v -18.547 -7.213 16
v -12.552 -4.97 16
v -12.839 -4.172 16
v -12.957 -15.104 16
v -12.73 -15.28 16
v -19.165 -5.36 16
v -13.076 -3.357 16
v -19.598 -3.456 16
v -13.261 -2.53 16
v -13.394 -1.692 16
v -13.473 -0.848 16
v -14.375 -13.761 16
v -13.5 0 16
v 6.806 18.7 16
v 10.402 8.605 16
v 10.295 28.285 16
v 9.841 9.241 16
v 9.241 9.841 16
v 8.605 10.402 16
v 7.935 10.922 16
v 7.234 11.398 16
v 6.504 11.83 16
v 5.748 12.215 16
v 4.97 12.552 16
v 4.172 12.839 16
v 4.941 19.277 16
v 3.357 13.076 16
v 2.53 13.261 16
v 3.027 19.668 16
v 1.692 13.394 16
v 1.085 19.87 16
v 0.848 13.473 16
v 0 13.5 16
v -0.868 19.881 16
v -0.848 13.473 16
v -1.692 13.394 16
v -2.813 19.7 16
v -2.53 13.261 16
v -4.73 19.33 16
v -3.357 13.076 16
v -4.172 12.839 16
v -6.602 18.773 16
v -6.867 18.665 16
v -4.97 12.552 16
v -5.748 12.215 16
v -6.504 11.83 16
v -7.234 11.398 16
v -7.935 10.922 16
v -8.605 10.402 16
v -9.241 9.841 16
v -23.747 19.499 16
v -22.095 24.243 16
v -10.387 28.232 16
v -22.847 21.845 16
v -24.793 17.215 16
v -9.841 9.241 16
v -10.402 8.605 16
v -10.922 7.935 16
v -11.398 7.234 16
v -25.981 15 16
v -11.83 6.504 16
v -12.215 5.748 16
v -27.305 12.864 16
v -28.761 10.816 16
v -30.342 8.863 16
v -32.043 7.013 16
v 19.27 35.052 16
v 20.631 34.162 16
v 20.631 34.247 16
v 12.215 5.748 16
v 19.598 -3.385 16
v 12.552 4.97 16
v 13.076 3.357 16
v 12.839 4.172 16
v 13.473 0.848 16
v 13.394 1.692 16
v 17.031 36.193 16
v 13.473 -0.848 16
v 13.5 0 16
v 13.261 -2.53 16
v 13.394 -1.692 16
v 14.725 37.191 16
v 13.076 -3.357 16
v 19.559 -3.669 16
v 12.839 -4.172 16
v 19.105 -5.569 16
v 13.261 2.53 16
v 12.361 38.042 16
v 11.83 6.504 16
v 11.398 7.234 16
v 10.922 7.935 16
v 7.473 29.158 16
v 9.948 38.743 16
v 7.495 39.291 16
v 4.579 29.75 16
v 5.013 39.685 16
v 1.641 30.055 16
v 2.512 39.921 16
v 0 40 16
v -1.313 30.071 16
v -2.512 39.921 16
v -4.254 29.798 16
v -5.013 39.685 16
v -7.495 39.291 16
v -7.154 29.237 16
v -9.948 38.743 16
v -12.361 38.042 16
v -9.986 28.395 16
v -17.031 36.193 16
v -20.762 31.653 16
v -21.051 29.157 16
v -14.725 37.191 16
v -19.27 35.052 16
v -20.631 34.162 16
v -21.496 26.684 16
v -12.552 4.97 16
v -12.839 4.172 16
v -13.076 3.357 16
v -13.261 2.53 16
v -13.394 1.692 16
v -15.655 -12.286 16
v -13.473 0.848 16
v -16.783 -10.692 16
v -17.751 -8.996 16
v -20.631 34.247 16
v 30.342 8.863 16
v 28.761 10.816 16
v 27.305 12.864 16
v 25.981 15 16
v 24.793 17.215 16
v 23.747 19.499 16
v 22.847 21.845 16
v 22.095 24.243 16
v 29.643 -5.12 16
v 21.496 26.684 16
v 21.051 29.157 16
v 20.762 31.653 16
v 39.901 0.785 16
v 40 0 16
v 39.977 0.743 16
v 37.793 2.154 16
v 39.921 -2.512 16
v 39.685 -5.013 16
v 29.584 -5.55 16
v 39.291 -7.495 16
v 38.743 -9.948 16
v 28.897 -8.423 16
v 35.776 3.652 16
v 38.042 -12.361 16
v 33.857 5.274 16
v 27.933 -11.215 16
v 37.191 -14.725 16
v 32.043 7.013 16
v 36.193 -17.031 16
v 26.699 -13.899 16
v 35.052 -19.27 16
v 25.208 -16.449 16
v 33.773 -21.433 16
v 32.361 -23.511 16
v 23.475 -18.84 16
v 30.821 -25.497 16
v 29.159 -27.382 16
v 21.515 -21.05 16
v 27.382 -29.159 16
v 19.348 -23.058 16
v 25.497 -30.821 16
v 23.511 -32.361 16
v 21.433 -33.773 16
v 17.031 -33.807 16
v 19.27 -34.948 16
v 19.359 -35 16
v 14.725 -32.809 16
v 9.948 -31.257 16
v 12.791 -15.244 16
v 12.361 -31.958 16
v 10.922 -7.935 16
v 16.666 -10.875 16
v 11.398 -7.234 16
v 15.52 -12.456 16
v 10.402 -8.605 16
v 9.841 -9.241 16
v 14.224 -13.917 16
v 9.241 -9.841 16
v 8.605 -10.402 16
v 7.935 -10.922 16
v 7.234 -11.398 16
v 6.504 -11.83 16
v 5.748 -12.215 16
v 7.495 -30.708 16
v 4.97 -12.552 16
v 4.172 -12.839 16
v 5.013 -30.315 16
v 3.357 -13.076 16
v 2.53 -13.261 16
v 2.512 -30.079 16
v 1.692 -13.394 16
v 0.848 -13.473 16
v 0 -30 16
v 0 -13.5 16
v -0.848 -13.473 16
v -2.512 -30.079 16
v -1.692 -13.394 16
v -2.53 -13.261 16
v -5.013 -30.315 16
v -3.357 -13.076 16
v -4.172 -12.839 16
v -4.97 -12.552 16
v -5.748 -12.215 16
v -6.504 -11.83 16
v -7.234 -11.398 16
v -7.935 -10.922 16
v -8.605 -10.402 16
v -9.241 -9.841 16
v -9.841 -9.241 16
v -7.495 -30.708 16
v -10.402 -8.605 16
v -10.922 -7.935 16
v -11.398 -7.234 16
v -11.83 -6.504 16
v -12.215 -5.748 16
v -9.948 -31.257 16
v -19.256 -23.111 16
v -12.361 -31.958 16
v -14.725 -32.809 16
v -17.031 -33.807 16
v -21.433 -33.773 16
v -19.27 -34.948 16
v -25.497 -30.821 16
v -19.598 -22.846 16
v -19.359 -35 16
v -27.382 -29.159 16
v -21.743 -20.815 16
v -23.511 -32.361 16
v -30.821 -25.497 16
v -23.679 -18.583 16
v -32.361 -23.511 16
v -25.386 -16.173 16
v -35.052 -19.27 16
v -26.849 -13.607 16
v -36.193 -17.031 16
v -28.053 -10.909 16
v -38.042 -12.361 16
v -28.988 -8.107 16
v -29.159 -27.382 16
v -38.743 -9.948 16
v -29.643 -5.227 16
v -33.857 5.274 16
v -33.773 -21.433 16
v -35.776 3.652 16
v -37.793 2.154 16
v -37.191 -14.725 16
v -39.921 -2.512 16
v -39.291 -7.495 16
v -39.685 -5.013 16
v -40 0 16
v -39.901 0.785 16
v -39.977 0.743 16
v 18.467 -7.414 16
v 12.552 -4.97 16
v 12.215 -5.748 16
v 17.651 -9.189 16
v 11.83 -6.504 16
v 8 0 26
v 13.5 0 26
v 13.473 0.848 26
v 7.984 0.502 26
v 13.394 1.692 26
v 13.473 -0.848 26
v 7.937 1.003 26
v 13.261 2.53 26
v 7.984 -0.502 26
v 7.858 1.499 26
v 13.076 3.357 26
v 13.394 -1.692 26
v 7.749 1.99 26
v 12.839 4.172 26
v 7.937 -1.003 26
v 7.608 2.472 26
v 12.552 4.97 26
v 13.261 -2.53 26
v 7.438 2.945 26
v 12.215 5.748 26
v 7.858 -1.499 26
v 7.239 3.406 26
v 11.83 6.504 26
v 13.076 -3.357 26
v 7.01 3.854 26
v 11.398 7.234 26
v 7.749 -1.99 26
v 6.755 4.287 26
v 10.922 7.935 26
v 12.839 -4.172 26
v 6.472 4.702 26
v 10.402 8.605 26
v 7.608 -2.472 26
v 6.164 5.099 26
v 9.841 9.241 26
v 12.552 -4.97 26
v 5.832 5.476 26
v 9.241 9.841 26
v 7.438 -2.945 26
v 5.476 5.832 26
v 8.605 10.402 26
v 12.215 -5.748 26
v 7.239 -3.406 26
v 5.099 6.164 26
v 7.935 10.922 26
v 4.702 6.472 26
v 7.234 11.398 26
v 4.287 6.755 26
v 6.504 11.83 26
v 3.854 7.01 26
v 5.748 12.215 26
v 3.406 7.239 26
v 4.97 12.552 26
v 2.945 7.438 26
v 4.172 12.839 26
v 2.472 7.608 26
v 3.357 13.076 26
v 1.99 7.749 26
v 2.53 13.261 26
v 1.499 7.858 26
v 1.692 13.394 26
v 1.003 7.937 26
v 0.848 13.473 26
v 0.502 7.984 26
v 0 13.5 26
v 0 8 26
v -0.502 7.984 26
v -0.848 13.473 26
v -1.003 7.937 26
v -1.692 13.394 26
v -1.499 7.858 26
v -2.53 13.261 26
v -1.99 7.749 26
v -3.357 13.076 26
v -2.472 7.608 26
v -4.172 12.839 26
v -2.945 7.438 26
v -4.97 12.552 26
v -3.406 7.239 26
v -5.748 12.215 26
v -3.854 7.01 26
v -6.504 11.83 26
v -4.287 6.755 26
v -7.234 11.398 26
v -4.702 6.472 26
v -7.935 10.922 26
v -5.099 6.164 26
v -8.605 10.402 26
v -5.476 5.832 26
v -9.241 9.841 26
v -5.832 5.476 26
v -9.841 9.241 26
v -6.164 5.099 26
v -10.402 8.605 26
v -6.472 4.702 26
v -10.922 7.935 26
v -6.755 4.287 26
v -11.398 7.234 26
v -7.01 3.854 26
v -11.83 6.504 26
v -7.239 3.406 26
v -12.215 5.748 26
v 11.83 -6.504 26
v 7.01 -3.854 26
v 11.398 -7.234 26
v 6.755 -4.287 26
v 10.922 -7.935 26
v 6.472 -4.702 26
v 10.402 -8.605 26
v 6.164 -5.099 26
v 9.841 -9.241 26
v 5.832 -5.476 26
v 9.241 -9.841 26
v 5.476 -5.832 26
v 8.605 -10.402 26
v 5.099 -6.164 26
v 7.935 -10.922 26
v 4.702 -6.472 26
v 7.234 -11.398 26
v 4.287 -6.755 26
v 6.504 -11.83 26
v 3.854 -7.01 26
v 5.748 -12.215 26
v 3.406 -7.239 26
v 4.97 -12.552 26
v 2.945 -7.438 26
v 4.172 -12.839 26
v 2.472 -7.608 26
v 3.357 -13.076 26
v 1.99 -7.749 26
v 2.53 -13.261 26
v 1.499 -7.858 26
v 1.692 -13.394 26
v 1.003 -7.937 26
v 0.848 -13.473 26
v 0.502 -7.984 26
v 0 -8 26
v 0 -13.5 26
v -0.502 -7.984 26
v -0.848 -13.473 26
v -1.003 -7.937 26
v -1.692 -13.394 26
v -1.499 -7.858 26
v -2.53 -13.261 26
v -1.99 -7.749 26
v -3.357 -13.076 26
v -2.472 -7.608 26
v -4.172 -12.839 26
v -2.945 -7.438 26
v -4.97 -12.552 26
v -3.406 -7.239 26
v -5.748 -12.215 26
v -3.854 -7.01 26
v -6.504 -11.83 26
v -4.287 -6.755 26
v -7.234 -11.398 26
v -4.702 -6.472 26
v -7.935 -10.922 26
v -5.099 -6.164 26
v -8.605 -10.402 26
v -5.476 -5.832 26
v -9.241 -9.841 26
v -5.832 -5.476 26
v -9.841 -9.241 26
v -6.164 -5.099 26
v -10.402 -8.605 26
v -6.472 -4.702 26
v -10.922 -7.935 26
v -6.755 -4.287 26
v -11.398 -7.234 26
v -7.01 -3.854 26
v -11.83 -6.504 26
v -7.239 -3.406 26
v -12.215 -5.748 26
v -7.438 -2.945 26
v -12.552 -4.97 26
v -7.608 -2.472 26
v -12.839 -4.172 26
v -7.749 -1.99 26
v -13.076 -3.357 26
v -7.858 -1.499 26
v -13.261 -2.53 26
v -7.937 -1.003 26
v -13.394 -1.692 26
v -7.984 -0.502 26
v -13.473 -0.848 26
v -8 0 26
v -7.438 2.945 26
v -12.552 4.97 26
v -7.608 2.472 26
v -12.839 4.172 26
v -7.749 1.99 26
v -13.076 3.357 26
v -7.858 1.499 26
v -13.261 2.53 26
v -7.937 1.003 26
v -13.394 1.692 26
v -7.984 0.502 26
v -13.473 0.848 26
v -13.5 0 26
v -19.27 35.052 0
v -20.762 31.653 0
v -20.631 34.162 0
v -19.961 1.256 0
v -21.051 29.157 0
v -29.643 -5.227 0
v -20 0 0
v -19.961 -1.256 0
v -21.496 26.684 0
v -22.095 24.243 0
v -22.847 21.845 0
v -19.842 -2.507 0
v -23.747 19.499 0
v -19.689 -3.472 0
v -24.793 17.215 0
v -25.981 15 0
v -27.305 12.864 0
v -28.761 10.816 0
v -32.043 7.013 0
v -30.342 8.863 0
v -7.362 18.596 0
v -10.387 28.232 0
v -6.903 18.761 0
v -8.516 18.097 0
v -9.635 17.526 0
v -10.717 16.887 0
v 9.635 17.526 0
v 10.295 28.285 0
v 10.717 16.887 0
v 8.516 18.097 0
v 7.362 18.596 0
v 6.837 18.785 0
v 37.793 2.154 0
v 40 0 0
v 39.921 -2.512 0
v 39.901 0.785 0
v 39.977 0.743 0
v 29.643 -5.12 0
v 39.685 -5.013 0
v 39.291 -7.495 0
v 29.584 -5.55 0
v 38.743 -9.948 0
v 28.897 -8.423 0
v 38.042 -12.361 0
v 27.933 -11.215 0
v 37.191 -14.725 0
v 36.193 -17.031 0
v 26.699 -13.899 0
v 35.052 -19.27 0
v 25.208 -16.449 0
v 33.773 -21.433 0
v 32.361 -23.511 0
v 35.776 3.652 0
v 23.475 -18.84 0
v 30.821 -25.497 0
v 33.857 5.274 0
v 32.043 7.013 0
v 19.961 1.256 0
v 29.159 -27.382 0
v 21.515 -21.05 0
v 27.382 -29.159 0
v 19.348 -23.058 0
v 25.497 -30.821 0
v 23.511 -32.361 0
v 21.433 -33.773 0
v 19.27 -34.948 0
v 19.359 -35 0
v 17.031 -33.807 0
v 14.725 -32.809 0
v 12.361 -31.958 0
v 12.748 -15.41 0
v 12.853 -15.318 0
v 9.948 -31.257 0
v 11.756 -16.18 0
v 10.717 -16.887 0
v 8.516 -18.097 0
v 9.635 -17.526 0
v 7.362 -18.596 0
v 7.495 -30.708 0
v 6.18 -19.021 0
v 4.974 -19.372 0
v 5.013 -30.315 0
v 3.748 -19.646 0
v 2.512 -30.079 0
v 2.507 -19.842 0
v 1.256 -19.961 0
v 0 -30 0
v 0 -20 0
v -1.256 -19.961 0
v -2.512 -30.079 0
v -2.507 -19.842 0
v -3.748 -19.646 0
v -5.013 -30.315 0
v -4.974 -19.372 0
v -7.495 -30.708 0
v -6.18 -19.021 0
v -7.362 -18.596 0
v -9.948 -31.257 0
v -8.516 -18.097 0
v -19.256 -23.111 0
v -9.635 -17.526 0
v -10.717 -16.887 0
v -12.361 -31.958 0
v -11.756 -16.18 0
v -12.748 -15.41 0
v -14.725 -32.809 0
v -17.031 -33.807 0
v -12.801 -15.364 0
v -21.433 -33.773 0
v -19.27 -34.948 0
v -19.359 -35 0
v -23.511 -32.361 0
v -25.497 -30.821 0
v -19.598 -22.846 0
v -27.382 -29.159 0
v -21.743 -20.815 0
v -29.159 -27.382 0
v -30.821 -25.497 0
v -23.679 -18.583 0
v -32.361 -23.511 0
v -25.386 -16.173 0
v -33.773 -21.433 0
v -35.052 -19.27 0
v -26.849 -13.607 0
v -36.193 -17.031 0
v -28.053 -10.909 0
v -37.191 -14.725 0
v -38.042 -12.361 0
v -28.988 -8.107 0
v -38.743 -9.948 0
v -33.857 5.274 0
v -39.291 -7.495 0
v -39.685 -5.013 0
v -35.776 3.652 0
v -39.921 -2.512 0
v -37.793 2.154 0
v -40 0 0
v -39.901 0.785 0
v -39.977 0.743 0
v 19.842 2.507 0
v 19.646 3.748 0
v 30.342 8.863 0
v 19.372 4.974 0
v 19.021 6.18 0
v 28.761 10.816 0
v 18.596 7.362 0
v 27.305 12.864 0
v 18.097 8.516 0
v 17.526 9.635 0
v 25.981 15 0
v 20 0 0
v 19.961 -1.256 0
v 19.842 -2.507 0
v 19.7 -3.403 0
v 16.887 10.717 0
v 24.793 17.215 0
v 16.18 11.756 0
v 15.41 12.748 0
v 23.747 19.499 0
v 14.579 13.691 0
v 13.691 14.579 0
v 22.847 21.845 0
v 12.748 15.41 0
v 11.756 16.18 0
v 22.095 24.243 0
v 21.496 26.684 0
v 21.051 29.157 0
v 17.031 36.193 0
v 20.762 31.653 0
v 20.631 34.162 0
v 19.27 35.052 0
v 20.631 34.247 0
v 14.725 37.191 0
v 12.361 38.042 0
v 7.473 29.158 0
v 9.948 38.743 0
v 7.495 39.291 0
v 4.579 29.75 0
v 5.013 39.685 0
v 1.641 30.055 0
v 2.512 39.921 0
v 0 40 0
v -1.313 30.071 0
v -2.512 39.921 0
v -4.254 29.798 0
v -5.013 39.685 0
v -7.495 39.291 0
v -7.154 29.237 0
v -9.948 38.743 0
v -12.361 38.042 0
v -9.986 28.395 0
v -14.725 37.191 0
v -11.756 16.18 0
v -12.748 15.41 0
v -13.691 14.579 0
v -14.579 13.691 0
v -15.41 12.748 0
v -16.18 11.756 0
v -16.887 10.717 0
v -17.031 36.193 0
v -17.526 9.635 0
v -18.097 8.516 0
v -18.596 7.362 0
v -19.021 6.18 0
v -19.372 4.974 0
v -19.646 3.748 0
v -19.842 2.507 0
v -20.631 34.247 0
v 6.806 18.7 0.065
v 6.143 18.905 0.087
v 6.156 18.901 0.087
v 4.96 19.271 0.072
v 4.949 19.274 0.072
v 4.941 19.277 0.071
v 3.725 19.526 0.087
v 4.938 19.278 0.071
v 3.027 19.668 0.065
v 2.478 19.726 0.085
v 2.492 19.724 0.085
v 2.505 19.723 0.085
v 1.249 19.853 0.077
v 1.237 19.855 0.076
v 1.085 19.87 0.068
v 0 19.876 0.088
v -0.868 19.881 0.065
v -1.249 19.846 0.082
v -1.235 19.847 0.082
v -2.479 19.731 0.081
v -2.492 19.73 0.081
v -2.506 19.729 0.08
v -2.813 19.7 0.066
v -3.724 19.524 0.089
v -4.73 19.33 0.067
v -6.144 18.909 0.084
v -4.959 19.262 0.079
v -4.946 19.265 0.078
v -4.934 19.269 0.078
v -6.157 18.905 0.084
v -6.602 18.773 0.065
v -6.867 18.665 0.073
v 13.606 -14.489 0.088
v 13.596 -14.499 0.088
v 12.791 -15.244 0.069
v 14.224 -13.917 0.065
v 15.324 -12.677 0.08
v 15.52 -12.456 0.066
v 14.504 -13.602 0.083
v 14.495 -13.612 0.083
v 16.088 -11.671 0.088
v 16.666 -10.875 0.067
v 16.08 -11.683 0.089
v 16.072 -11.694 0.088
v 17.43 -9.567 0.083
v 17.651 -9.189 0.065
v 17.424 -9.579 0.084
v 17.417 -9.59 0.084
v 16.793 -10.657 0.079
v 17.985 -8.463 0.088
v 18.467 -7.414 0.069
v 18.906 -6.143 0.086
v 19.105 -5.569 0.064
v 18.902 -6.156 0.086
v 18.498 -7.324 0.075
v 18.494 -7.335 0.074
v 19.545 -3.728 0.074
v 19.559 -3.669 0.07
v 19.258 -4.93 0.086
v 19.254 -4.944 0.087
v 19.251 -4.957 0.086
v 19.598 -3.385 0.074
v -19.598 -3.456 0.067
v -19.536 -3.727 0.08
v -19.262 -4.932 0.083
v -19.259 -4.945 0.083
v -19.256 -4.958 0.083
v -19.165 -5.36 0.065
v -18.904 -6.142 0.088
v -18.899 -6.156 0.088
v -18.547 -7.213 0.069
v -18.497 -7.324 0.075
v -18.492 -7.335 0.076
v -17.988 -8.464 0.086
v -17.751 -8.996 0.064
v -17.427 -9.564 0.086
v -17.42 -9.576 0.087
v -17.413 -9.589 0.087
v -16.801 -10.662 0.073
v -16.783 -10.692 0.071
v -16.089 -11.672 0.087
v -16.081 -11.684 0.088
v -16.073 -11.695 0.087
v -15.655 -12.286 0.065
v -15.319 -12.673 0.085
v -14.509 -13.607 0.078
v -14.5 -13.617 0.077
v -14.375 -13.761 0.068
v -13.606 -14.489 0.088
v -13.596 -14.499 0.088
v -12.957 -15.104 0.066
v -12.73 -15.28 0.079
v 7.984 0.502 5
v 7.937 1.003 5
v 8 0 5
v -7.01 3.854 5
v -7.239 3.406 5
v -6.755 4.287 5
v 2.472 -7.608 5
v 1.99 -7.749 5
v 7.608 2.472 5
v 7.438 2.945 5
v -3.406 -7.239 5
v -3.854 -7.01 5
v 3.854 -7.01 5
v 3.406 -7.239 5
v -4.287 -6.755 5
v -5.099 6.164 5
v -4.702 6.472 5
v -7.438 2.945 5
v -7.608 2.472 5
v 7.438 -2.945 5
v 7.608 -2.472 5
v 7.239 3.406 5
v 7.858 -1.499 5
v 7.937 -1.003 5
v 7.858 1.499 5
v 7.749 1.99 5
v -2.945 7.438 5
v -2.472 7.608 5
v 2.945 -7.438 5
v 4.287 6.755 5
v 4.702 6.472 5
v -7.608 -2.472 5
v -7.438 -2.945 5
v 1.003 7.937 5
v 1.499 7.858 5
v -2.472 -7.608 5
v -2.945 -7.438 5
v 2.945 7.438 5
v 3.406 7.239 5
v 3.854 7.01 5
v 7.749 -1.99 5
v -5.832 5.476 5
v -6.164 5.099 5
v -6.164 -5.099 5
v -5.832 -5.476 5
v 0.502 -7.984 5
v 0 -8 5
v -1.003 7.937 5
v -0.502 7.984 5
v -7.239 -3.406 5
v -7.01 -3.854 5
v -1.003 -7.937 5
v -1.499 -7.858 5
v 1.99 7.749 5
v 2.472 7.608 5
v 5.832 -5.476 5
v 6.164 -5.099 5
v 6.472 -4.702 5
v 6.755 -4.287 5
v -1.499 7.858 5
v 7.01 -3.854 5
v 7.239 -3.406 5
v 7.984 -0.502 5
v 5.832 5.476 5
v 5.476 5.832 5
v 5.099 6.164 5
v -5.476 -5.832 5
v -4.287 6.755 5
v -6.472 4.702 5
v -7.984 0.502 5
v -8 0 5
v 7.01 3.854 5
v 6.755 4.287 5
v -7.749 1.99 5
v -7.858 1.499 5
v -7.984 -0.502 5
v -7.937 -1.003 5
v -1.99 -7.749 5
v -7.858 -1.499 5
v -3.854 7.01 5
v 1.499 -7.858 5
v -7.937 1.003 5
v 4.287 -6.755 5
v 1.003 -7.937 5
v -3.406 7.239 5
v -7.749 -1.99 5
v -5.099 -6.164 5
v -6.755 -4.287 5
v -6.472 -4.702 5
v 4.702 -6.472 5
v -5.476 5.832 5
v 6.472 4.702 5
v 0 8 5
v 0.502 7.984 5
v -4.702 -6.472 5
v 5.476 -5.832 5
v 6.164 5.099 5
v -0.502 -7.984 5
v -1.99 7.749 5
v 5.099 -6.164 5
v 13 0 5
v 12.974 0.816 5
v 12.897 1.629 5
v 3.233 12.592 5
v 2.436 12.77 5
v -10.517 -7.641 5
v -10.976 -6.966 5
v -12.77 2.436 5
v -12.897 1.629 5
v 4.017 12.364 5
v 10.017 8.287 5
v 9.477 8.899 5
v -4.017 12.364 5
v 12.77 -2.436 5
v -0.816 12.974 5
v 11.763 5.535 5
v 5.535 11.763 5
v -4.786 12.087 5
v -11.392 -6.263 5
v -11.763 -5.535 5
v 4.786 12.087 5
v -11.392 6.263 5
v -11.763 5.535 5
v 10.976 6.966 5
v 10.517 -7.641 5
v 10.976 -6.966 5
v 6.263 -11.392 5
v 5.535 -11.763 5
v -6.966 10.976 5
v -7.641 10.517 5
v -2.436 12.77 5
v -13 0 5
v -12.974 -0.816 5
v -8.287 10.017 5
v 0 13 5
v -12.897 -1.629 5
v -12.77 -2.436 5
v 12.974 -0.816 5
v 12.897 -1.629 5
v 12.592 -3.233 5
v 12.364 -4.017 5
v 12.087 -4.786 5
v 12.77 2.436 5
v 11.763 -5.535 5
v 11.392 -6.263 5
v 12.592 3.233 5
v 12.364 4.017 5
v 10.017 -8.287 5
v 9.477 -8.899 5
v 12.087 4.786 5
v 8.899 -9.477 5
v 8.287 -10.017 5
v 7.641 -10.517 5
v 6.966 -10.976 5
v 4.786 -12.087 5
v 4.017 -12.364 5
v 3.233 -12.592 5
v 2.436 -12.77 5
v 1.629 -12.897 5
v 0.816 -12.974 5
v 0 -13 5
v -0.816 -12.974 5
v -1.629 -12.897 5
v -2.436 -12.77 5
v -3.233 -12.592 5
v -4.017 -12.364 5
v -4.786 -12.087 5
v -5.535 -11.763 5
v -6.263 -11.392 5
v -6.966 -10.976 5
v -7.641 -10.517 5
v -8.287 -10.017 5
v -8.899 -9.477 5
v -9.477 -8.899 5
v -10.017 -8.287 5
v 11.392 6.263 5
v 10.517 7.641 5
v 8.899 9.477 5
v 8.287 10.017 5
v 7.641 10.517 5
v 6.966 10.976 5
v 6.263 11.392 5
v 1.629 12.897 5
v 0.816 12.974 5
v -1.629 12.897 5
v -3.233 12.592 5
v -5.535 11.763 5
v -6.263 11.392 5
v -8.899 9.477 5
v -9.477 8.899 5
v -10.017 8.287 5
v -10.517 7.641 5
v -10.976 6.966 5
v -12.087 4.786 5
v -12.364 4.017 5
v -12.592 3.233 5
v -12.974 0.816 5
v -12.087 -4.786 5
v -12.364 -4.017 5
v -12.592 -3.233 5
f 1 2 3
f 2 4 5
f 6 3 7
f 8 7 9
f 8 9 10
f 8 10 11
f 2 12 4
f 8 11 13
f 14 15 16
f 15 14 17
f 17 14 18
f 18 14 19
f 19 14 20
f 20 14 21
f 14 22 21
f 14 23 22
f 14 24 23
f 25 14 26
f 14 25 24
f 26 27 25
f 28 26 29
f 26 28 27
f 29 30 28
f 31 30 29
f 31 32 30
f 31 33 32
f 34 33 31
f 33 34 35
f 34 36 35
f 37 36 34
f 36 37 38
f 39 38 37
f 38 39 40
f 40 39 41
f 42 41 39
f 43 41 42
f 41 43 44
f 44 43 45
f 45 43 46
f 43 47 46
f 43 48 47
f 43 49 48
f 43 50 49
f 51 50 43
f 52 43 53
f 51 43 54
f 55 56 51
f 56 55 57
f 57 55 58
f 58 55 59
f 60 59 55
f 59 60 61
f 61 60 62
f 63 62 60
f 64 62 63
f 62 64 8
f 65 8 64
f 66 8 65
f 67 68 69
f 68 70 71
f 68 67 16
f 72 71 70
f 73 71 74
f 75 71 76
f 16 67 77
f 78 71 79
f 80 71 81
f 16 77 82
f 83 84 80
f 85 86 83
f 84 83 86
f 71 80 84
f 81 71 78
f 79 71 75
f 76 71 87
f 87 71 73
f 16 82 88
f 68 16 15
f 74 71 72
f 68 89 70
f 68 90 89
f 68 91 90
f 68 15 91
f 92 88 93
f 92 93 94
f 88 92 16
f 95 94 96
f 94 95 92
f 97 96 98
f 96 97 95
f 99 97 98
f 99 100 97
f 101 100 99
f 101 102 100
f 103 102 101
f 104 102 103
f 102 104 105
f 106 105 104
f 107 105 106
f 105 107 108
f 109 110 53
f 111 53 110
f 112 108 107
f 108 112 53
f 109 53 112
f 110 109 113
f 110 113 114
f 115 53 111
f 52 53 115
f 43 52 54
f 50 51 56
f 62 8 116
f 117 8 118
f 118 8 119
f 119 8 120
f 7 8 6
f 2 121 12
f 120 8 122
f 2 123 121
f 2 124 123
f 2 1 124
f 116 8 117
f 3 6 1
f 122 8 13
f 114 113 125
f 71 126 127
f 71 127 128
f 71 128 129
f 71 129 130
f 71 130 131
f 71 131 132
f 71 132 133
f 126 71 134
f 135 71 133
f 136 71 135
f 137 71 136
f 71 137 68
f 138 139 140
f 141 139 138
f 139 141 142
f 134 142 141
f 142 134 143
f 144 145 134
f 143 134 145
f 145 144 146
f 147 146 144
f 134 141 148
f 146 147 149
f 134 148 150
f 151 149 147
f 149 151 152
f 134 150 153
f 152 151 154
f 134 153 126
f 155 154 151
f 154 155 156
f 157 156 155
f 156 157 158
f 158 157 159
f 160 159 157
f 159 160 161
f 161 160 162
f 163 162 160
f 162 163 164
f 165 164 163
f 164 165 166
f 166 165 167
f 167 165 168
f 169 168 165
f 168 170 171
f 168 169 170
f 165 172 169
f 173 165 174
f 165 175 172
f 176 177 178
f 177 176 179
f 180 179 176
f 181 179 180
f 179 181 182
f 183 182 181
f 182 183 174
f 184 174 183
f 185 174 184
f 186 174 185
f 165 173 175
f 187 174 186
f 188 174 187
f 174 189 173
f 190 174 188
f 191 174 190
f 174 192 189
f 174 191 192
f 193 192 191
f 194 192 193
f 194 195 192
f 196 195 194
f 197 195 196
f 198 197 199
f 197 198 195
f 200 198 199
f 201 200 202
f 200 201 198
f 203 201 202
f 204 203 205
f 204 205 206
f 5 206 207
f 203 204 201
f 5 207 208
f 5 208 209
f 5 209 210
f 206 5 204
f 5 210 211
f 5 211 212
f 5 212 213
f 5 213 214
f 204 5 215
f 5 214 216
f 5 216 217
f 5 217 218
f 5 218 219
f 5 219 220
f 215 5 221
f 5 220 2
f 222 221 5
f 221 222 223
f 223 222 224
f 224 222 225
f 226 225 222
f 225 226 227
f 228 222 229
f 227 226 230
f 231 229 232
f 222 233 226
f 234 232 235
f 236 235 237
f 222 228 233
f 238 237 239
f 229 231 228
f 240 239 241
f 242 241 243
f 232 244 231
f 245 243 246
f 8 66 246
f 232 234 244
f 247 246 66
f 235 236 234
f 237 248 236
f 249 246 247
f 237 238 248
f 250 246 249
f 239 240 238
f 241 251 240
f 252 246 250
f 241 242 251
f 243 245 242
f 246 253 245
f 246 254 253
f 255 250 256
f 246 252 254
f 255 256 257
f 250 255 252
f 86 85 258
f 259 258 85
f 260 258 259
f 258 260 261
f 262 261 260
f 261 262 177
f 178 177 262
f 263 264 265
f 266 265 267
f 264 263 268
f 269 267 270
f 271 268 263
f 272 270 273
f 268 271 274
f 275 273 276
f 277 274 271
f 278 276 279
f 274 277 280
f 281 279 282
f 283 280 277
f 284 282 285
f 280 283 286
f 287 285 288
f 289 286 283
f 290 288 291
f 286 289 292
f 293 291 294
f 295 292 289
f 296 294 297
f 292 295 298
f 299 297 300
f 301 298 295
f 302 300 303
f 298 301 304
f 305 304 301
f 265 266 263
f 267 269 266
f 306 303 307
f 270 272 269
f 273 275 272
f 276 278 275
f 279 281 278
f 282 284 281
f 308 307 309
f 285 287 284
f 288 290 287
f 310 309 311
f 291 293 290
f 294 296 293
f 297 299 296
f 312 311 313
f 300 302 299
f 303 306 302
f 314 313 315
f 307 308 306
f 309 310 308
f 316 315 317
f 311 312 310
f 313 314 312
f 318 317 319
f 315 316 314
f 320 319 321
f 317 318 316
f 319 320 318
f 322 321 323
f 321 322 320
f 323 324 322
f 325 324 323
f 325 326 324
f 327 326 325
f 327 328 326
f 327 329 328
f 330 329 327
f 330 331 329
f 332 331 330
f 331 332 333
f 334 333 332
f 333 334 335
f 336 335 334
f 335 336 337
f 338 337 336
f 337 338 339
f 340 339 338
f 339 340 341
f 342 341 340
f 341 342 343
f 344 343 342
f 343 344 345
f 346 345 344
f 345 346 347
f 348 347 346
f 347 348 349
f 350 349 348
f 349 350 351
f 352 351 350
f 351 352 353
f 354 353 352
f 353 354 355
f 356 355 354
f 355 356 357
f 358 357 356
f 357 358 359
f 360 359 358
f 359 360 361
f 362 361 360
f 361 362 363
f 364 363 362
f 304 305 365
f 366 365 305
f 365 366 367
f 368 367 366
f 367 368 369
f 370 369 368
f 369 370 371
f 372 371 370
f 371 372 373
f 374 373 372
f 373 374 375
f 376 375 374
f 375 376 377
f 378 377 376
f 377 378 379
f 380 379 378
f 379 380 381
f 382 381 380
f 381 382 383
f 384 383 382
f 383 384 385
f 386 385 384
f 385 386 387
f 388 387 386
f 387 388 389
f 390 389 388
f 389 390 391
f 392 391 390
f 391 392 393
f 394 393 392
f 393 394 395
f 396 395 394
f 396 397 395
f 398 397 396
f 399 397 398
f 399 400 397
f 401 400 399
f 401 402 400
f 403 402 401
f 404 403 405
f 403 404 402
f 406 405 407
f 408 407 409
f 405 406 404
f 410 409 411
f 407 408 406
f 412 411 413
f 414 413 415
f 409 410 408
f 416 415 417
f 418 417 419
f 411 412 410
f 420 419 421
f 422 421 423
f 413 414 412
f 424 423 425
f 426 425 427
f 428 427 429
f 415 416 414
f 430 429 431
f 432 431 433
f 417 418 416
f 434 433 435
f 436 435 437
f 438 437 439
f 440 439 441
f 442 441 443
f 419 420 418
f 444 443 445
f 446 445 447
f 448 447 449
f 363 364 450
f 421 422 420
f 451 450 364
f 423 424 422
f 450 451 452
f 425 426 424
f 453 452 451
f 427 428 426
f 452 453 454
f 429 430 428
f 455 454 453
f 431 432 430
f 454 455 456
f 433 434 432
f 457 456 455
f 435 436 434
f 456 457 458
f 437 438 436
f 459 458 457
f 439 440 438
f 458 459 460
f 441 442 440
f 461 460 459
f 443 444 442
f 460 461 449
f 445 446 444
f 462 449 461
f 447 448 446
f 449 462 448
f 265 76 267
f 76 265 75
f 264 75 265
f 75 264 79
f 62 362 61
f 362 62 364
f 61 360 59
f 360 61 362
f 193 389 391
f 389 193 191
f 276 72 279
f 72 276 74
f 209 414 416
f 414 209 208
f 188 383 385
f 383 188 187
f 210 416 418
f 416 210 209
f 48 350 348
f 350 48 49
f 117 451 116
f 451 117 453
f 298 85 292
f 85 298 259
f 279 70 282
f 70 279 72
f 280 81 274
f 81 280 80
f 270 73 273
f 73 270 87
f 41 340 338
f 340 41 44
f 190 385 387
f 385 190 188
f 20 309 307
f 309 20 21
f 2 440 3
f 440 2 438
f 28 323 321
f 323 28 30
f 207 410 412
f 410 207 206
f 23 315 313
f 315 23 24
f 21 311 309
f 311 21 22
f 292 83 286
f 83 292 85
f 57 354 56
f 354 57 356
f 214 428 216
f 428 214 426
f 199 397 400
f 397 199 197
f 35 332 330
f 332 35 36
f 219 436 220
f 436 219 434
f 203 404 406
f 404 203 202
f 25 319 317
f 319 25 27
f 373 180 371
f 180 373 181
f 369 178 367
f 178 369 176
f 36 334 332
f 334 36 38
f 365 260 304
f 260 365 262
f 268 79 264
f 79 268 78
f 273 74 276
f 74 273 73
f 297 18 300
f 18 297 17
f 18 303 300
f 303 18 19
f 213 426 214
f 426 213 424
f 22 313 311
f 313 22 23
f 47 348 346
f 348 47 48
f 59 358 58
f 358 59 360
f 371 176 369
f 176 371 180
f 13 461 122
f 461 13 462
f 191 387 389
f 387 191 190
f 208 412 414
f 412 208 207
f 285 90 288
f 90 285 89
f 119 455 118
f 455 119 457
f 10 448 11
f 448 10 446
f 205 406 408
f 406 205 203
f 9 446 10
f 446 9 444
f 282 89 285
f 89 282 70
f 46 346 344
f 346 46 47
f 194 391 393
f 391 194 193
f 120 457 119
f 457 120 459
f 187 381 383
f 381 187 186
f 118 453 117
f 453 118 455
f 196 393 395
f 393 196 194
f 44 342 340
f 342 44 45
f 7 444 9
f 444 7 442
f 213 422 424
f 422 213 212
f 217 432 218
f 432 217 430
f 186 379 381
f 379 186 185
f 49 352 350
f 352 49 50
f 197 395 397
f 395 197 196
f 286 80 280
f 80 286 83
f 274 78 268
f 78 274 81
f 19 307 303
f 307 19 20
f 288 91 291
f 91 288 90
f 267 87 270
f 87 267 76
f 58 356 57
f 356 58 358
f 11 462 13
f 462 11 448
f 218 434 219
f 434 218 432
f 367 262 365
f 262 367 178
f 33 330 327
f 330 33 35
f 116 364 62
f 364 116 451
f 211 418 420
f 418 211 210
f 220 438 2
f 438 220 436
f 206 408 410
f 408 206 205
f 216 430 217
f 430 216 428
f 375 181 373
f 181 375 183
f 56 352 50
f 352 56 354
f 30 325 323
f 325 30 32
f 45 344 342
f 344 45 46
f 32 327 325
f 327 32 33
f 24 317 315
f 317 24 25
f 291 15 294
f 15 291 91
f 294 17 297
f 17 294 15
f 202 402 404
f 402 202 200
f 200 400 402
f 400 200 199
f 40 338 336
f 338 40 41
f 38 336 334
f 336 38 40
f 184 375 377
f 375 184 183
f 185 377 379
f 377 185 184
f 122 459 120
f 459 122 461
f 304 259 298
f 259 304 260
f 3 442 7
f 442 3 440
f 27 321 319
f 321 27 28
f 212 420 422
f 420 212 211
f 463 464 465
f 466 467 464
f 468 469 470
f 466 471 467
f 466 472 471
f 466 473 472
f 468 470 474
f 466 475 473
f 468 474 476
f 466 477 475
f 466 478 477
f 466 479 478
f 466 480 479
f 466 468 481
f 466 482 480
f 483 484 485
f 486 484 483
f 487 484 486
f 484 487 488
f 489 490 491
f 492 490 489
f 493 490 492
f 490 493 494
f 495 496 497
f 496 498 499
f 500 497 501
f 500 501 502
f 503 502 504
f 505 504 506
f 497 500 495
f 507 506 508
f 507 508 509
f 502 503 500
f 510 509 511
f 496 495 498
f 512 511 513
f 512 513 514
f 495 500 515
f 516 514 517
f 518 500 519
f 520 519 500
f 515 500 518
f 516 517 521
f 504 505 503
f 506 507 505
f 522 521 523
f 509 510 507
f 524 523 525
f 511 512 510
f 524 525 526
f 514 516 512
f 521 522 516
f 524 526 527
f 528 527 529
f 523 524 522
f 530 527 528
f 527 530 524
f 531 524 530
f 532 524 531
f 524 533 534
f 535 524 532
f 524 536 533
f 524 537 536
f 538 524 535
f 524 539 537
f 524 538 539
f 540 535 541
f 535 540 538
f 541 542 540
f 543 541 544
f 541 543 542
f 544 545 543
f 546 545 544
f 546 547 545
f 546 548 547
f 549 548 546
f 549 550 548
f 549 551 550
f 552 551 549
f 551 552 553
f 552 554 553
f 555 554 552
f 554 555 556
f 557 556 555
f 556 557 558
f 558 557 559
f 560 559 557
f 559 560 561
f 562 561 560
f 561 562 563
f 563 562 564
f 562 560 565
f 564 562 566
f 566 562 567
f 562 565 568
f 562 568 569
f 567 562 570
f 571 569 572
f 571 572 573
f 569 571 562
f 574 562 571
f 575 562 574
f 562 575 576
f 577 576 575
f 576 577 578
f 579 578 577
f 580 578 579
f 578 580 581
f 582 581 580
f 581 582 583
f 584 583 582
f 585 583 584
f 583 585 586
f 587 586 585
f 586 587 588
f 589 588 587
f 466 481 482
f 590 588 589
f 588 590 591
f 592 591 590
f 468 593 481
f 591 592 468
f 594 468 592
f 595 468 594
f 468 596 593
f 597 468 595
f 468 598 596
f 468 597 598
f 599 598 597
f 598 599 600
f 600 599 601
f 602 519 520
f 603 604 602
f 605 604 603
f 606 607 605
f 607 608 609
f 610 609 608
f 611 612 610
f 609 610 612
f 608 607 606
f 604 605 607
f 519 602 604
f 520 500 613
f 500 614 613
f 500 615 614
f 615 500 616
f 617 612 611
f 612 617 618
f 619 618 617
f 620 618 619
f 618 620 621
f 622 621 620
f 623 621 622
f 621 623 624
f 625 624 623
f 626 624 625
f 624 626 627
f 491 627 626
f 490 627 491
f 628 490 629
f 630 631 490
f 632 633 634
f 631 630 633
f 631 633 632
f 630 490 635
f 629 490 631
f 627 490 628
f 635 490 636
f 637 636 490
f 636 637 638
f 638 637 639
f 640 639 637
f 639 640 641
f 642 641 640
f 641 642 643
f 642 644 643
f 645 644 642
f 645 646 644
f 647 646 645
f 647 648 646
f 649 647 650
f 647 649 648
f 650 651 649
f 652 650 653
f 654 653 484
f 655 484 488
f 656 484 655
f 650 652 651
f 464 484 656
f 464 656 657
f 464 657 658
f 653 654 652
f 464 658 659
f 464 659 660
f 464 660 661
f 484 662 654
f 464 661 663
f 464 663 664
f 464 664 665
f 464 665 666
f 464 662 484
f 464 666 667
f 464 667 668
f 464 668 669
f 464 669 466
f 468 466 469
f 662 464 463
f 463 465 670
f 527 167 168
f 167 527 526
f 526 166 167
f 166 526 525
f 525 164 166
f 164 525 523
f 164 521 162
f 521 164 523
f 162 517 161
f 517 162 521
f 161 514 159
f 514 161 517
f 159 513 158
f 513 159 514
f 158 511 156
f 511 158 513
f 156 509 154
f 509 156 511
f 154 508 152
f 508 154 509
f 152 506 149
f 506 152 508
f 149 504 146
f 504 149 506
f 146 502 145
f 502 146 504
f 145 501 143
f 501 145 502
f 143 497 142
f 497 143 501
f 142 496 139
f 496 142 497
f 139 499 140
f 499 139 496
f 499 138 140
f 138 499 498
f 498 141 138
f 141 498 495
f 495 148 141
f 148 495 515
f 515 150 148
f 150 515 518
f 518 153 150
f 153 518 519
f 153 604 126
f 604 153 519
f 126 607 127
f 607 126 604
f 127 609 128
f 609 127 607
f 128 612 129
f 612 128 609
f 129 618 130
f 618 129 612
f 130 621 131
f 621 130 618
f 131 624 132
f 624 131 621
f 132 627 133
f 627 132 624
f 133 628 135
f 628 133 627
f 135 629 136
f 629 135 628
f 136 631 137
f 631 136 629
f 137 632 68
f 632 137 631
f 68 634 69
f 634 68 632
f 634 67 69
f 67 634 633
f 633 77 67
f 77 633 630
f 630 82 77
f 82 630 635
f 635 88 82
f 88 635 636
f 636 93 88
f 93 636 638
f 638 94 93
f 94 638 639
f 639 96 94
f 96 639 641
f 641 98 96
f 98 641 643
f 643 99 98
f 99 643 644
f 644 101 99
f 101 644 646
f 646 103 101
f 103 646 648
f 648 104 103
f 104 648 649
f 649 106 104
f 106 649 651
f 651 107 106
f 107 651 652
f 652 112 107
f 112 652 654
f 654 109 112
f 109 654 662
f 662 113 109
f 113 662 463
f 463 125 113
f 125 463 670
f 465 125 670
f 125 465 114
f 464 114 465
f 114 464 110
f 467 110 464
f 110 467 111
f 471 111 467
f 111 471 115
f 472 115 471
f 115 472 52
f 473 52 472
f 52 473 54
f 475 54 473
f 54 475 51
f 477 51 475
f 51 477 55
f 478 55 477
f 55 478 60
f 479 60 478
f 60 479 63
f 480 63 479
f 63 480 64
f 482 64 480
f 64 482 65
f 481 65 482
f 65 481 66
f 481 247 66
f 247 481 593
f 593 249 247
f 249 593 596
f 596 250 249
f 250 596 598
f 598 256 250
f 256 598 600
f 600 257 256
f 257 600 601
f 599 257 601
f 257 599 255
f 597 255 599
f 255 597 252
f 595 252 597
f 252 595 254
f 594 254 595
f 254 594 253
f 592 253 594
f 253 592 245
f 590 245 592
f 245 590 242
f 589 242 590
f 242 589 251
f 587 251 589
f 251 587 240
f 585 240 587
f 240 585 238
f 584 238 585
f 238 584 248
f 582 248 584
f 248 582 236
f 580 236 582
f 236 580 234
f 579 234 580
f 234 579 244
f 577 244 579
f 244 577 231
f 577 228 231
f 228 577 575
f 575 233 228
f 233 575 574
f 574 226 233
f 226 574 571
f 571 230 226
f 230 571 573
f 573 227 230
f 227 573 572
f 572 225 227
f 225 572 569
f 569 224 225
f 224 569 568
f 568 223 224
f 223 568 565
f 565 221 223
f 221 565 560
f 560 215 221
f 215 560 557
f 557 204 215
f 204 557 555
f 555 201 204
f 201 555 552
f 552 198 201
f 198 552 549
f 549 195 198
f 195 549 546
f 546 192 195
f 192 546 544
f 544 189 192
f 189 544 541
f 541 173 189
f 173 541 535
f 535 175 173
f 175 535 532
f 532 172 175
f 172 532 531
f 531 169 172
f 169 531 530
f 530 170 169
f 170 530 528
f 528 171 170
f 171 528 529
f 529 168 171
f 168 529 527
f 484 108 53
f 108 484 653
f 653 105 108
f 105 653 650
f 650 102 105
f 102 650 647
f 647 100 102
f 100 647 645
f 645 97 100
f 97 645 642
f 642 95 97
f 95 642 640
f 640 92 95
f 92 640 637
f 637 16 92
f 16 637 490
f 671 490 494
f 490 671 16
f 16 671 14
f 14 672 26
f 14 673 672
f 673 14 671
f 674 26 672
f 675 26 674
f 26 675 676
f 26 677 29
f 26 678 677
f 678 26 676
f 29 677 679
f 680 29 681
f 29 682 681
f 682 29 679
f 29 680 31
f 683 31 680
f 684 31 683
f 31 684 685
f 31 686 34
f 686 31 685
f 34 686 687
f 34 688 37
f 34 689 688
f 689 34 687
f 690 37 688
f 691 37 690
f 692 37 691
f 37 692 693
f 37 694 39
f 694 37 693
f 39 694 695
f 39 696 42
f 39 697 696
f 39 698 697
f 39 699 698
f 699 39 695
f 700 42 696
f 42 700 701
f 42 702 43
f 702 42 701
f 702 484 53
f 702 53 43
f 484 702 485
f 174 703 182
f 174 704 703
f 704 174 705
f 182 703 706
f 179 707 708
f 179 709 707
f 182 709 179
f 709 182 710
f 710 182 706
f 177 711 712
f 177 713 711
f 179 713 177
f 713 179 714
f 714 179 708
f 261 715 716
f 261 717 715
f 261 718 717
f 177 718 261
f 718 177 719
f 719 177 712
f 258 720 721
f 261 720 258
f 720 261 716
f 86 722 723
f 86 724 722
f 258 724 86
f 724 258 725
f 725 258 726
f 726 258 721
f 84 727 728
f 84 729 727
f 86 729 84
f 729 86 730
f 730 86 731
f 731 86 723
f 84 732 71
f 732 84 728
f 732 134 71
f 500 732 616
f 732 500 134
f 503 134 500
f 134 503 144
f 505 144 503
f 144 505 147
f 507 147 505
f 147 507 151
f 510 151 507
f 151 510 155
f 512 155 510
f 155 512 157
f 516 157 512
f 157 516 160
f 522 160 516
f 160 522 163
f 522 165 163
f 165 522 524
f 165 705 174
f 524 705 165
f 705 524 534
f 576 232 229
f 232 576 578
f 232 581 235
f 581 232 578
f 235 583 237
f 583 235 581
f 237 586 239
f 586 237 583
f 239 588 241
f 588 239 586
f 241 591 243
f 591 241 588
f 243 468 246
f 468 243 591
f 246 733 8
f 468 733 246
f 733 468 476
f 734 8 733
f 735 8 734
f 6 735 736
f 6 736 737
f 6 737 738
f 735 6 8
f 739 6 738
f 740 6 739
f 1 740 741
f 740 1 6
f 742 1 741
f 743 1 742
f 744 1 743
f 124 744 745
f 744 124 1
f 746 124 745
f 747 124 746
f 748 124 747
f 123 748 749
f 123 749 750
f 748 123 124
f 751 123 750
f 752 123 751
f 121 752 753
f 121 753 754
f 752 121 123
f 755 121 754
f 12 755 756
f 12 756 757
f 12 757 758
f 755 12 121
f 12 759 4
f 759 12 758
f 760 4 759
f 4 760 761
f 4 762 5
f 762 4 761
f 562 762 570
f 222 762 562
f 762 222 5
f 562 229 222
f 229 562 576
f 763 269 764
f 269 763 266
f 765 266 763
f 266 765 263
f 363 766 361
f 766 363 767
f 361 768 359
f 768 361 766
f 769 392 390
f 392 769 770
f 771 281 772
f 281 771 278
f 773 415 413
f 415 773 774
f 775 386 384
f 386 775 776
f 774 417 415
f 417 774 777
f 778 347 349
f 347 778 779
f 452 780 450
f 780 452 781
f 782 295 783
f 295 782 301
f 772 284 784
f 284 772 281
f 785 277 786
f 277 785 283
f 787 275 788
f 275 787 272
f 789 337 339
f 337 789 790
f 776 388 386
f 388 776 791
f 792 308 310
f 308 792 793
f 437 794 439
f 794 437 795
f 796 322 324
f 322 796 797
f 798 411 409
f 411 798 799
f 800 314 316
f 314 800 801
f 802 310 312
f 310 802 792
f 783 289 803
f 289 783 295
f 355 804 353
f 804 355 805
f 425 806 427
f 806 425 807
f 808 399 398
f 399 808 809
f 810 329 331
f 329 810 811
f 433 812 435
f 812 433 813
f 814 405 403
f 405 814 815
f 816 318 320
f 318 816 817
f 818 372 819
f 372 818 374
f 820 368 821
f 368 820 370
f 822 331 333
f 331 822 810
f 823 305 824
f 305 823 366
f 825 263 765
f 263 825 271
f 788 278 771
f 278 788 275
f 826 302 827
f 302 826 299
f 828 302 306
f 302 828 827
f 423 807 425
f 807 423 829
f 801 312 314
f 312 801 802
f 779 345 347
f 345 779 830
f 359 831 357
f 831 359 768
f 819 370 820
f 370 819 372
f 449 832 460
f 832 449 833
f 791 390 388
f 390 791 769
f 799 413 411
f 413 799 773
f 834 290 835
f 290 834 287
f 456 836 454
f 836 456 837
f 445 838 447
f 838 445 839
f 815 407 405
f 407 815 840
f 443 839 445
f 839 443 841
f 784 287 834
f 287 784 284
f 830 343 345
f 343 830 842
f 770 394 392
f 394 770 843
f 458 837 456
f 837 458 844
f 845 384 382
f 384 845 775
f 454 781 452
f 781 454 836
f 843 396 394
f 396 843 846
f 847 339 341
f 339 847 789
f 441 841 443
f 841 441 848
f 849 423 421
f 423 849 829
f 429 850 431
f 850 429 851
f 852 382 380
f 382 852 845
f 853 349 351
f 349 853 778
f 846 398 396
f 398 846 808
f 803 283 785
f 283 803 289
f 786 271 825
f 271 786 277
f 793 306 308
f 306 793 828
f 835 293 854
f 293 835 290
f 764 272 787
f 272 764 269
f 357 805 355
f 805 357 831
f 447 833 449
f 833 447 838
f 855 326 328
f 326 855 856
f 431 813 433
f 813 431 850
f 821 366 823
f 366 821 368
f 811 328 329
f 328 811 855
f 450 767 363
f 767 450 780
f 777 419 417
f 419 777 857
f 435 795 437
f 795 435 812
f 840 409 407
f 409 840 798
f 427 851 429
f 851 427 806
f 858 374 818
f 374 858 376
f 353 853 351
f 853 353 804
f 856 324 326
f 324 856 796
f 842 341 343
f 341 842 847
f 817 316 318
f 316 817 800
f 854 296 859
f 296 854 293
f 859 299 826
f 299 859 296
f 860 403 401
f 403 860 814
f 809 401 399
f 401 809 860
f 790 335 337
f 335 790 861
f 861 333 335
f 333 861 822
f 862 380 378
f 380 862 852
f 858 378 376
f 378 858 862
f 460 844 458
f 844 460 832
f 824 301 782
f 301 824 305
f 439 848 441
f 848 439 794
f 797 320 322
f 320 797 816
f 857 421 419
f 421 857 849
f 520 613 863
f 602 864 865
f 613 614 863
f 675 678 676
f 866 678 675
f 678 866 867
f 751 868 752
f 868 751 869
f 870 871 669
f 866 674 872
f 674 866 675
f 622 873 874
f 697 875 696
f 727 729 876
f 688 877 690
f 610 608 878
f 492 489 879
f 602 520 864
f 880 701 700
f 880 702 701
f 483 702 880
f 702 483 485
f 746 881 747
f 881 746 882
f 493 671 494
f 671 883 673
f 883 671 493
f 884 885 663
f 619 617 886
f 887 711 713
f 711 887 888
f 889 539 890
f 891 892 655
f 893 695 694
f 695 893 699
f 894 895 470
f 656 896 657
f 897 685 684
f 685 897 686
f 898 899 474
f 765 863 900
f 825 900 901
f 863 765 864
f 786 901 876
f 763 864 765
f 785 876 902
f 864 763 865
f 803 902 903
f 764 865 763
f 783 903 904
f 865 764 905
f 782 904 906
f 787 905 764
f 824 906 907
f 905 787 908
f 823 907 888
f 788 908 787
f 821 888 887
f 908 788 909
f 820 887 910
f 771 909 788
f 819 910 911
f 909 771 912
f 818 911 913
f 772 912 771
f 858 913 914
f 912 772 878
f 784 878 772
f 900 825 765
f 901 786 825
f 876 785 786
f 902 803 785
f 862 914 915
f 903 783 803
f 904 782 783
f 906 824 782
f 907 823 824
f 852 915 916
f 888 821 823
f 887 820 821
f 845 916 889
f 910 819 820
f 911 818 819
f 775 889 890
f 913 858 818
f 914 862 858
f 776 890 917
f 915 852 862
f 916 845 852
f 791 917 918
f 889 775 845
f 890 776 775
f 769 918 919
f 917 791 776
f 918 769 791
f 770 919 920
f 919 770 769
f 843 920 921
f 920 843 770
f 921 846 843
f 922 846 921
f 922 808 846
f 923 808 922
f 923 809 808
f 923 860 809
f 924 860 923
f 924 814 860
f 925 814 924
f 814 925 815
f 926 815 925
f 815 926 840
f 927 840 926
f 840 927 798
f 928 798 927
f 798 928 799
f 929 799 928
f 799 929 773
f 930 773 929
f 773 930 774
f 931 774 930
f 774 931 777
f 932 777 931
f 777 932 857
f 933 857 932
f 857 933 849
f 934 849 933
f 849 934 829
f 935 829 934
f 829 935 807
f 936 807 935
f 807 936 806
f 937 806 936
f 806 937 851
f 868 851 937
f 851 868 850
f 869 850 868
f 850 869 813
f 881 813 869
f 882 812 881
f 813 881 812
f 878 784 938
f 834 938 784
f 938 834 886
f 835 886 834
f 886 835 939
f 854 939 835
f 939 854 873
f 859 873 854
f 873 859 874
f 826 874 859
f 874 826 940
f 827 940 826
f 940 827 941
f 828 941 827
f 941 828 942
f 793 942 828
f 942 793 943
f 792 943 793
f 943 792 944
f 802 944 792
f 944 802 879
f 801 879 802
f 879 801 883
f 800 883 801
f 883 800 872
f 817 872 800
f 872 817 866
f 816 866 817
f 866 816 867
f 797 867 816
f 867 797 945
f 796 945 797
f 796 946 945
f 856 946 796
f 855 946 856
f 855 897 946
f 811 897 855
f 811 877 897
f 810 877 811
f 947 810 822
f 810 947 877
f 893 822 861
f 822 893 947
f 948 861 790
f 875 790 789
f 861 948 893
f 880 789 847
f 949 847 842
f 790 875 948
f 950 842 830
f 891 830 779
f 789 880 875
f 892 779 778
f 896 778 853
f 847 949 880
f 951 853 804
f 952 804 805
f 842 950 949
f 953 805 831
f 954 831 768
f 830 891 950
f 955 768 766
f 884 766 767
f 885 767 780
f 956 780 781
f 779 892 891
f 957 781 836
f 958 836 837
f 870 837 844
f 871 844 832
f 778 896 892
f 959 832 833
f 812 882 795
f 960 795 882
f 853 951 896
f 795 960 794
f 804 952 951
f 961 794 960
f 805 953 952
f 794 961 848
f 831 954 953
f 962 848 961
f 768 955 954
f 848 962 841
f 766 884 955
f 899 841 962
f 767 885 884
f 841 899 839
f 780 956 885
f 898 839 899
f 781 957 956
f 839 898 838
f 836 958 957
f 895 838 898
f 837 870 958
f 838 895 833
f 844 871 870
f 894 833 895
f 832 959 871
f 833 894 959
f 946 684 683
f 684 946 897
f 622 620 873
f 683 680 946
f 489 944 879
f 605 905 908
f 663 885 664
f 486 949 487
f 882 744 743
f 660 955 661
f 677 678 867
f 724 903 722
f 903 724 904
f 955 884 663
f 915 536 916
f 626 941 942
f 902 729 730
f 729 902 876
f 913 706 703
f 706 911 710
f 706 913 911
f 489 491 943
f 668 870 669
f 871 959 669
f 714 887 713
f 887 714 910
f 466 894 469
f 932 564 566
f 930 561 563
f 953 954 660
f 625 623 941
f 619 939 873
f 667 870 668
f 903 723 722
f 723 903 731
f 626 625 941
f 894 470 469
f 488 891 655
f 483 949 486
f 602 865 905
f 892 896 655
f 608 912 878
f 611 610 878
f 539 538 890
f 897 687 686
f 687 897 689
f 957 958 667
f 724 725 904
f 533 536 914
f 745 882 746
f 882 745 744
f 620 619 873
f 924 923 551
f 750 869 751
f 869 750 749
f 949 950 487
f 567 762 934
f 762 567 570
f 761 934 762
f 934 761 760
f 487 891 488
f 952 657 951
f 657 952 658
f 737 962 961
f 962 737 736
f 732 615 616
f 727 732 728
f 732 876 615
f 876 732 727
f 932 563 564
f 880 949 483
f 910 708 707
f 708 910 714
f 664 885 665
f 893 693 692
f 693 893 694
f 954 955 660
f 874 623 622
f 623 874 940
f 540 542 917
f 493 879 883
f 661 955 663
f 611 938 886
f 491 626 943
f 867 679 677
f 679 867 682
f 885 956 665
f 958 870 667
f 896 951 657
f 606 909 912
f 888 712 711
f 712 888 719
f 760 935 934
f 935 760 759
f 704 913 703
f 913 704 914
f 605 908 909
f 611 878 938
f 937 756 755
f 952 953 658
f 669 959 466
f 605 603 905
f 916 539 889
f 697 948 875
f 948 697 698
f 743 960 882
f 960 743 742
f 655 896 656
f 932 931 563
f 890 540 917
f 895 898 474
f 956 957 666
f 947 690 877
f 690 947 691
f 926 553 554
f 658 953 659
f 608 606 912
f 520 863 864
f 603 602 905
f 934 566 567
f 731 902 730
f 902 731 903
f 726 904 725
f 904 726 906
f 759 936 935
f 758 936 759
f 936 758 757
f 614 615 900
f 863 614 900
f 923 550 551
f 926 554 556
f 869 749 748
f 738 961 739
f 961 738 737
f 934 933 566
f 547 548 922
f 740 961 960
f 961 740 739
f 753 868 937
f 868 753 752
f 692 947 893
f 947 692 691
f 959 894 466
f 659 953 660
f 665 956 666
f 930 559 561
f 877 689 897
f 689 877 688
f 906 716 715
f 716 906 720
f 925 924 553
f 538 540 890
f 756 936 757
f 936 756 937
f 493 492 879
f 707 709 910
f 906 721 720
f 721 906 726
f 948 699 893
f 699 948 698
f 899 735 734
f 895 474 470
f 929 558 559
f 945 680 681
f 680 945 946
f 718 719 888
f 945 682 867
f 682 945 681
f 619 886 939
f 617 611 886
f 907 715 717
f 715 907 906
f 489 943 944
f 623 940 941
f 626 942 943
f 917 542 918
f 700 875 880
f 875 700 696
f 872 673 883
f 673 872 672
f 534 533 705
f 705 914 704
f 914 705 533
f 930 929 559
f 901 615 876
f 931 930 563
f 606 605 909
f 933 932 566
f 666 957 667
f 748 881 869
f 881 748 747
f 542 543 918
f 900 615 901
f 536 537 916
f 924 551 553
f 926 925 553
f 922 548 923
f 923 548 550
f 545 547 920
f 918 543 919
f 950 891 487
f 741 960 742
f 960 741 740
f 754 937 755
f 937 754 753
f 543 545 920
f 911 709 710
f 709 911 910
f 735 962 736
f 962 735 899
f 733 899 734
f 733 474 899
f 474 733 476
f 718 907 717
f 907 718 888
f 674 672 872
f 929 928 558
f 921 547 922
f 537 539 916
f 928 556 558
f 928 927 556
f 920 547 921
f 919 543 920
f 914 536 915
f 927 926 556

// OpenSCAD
//Adapter für Spulen-Abroller
//Parametrisch!


$fn=100*1;
//Spool hole diameter
numerical_slider = 27;//[20:60]

//Pizza is very tasty
module pizza(r=3.0,a=30) {
  $fn=64;
  intersection() {
    circle(r=r);
    square(r);
    rotate(a-90) square(r);
  }
};


difference(){
    linear_extrude(height=26){
        difference(){
            circle(r=40);
            for(i=[30:120:270]){
                rotate(i)translate([70,0])circle(r=40);
            };
            for(i=[70:120:450]){
                difference(){
                    rotate(i)pizza(30.1,40.2);
                    rotate(i)pizza(19.9,40.2);
                };
            };
        };
    };
    translate([0,0,16])difference(){
        cylinder(r=40,10);
        cylinder(d=numerical_slider,10);
    };
    cylinder(r=8,26);
    cylinder(r1=20,r2=13,5);
};


